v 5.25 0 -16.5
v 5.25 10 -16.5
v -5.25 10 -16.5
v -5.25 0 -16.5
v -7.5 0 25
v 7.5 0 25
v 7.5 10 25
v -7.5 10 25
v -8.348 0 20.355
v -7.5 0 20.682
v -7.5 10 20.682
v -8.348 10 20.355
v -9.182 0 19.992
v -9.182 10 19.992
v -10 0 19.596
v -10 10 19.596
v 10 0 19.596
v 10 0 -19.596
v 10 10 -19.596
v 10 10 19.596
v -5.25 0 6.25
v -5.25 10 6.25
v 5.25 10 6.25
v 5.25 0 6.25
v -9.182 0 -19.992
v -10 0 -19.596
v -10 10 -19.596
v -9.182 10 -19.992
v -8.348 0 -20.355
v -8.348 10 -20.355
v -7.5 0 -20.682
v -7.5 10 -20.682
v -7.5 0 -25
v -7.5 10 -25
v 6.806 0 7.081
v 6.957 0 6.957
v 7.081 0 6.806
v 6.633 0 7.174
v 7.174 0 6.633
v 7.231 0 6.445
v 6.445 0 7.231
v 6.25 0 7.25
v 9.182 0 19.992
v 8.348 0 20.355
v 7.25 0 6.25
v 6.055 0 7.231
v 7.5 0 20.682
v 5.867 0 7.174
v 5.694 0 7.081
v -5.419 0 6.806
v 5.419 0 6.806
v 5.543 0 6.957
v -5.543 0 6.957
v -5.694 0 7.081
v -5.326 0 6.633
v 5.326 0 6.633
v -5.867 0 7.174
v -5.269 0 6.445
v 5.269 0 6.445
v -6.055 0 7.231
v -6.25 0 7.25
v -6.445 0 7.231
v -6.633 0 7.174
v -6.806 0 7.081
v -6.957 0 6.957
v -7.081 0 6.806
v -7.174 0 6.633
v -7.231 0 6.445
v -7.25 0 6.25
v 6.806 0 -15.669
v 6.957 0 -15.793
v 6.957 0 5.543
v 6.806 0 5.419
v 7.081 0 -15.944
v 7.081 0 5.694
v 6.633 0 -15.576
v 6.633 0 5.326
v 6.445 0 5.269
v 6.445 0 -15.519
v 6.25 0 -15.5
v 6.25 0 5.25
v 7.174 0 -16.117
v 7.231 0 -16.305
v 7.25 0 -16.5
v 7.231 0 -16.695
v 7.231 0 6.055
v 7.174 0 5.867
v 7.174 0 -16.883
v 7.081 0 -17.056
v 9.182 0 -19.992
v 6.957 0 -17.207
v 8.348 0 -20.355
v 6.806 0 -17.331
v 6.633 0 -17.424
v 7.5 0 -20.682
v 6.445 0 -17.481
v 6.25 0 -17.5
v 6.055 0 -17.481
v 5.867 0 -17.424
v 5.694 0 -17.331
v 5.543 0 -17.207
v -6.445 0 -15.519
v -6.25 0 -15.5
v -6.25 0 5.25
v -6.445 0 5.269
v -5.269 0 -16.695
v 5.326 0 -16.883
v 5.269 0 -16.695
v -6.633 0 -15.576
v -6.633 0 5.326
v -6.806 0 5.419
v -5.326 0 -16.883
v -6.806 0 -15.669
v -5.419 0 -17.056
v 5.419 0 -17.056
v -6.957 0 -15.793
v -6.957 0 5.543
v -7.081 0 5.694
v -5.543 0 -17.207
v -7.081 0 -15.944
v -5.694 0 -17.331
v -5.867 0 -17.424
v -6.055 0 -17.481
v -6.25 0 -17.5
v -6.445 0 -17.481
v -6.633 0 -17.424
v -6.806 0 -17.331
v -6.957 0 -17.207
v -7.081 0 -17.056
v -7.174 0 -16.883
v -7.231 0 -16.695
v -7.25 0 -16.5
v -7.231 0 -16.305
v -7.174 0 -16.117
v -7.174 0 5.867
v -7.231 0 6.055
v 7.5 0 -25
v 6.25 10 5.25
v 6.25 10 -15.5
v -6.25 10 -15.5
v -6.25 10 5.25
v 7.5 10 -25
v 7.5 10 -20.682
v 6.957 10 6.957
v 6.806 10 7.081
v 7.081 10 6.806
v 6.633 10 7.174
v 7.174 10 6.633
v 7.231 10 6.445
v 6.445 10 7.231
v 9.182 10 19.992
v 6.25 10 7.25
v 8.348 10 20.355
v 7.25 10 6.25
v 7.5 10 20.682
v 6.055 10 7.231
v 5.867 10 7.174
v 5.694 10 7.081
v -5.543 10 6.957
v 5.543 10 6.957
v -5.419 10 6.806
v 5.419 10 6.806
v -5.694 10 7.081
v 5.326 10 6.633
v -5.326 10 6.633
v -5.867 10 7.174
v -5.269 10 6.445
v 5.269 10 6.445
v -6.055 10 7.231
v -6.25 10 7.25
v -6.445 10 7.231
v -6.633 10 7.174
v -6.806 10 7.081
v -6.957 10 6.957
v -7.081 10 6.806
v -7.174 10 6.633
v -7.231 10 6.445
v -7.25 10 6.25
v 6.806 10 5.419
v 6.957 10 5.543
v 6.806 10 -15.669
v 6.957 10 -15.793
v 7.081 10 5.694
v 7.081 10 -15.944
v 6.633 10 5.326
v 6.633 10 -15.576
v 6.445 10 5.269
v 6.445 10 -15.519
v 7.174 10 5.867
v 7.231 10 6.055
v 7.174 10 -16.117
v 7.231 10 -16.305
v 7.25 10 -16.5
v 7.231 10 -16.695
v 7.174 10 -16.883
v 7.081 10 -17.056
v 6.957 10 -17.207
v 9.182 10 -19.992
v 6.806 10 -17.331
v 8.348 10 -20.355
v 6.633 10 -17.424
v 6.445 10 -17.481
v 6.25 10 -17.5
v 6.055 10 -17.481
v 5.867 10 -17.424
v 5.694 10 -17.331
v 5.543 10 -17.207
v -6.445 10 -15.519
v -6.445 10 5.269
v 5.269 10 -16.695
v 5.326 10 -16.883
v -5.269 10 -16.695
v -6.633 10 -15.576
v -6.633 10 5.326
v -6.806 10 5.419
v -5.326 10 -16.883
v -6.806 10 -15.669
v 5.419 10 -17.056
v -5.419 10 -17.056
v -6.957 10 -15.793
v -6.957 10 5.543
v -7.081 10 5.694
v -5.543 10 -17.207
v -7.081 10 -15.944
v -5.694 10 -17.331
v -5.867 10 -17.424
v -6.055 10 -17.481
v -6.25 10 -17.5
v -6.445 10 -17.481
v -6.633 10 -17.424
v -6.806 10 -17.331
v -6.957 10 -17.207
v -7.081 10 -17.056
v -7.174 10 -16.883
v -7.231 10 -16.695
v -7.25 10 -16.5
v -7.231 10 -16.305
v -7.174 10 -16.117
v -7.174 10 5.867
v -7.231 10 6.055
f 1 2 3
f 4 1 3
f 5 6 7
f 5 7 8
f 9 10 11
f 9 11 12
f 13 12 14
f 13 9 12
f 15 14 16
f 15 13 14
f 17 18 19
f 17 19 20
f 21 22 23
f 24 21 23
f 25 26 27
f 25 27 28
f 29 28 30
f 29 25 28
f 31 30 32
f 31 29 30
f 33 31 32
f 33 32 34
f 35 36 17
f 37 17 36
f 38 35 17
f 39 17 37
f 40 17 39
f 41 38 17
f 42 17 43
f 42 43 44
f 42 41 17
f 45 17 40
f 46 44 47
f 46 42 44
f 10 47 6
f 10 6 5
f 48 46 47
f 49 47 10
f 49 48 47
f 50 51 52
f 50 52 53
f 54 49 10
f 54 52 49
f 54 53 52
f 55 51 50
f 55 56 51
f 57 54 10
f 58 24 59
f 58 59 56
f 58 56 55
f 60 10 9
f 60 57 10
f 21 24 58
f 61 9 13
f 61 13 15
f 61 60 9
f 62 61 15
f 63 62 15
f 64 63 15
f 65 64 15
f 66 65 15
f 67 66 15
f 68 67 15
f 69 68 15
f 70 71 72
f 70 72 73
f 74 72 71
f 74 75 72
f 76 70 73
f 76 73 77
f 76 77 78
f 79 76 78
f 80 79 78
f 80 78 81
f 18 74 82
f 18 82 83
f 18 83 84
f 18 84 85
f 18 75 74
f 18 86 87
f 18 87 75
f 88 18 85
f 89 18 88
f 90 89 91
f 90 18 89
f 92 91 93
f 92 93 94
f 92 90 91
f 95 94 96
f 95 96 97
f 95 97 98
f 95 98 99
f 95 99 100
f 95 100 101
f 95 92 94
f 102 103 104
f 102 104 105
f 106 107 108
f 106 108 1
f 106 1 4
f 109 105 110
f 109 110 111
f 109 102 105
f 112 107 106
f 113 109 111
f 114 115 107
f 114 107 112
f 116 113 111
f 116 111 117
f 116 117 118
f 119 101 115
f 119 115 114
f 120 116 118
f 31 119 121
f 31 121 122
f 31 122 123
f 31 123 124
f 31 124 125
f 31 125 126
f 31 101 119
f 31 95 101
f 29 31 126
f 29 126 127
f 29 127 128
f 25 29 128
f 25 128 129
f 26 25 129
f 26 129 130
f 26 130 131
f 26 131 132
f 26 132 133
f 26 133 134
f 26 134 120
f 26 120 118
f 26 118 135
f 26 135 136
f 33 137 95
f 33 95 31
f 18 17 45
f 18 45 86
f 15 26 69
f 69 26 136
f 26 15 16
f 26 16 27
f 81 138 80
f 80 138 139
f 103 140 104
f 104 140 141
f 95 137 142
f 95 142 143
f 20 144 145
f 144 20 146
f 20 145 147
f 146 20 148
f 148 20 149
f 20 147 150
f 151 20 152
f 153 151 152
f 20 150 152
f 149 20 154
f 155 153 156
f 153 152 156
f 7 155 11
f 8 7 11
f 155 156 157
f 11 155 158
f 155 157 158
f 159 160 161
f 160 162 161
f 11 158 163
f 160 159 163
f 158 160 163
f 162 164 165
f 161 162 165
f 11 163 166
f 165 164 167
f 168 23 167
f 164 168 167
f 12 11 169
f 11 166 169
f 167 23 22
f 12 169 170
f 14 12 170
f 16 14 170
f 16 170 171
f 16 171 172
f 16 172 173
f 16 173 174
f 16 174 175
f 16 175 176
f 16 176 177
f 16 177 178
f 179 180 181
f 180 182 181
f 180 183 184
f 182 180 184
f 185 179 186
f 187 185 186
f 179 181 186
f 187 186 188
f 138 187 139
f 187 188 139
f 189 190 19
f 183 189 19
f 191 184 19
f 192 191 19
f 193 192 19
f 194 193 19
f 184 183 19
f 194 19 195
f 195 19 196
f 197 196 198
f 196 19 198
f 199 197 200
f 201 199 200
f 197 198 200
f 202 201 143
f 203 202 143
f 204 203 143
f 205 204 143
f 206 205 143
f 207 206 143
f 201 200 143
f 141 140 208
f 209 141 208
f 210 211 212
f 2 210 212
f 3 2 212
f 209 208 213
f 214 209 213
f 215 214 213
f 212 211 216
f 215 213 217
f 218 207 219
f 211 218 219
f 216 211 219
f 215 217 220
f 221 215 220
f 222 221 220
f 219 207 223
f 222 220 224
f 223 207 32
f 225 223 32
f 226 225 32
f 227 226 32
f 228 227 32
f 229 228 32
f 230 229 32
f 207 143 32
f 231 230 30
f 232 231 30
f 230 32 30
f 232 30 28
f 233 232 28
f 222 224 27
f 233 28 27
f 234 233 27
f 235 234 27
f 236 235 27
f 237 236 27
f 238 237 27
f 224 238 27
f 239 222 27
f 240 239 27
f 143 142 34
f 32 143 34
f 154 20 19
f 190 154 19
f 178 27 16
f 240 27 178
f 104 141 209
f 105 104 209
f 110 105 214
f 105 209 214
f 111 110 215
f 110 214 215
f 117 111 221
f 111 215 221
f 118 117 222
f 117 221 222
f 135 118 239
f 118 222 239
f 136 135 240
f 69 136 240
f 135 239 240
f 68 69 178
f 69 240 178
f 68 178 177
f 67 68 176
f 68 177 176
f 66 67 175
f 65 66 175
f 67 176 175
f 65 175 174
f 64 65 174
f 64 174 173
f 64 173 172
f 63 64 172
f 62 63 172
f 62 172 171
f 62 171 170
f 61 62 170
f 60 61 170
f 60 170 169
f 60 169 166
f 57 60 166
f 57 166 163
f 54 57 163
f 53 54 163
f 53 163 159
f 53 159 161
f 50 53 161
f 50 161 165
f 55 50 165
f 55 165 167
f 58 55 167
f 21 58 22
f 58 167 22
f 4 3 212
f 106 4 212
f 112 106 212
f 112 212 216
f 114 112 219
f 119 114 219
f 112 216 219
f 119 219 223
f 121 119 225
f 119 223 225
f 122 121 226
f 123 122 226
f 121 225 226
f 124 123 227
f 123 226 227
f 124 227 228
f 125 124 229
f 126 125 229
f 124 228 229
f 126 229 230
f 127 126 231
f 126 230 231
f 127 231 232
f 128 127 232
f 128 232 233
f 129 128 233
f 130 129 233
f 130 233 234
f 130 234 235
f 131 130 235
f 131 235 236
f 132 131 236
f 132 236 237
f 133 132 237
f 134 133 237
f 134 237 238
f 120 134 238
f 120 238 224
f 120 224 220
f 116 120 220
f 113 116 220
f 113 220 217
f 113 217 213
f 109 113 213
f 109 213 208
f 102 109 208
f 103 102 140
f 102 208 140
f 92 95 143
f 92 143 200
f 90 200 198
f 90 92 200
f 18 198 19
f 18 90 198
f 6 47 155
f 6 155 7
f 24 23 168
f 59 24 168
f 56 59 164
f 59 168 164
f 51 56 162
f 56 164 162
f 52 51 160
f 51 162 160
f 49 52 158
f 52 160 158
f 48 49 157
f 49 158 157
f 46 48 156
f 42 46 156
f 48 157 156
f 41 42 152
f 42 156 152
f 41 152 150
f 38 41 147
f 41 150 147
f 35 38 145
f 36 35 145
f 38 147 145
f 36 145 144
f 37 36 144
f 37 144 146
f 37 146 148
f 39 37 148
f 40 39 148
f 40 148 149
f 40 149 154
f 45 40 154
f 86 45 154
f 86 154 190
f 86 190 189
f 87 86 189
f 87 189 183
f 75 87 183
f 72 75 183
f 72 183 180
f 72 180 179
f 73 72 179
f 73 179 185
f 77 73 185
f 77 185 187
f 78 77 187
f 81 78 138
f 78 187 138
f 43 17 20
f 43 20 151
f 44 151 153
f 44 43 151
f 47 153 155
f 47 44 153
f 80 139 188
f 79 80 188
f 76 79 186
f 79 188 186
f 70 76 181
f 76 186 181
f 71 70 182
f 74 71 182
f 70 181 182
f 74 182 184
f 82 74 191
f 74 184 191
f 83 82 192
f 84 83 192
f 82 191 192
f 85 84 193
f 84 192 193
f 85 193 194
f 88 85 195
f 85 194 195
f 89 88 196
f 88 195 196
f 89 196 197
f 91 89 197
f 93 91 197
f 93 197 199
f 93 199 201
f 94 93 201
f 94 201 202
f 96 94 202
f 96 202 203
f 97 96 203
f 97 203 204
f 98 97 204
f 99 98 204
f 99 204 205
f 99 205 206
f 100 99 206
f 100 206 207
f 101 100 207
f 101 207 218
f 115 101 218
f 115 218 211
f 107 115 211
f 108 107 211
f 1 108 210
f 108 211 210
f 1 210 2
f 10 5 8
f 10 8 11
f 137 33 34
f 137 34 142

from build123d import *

# Parameters (mm, degrees)
RESSALTO_EXTRUS_O1_DEPTH = 10
CORTE_EXTRUS_O1_DEPTH    = 29.722813233


with BuildPart() as part:
    # Esboço1 → Ressalto-extrusão1 (new body)
    with BuildSketch(Plane(origin=(0, 0, 0), x_dir=(1, 0, 0), z_dir=(0, 1, 0))):
        with BuildLine():
            Line((-7.5, 20.68211788), (-7.5, 25))
            Line((-7.5, 25), (7.5, 25))
            Line((7.5, 25), (7.5, 20.68211788))
            ThreePointArc((7.5, 20.68211788), (8.766838517, 20.177773475), (10, 19.595917942))
            Line((10, 19.595917942), (10, -19.595917942))
            ThreePointArc((10, -19.595917942), (8.766838517, -20.177773475), (7.5, -20.68211788))
            Line((7.5, -20.68211788), (7.5, -25))
            Line((7.5, -25), (-7.5, -25))
            Line((-7.5, -25), (-7.5, -20.68211788))
            ThreePointArc((-7.5, -20.68211788), (-8.766838517, -20.177773475), (-10, -19.595917942))
            Line((-10, -19.595917942), (-10, 19.595917942))
            ThreePointArc((-10, 19.595917942), (-8.766838517, 20.177773475), (-7.5, 20.68211788))
        make_face()
    extrude(amount=RESSALTO_EXTRUS_O1_DEPTH)

    # Esboço2 → Corte-extrusão1 (cut, through all)
    with BuildSketch(Plane(origin=(0, 10, 0), x_dir=(1, 0, 0), z_dir=(0, 1, 0))):
        with BuildLine():
            Line((5.25, 16.5), (-5.25, 16.5))
            ThreePointArc((-5.25, 16.5), (-6.957106781, 17.207106781), (-6.25, 15.5))
            Line((-6.25, 15.5), (-6.25, -5.25))
            ThreePointArc((-6.25, -5.25), (-6.957106781, -6.957106781), (-5.25, -6.25))
            Line((-5.25, -6.25), (5.25, -6.25))
            ThreePointArc((5.25, -6.25), (6.957106781, -6.957106781), (6.25, -5.25))
            Line((6.25, -5.25), (6.25, 15.5))
            ThreePointArc((6.25, 15.5), (6.957106781, 17.207106781), (5.25, 16.5))
        make_face()
    extrude(amount=-CORTE_EXTRUS_O1_DEPTH, mode=Mode.SUBTRACT)


solid = part.part
